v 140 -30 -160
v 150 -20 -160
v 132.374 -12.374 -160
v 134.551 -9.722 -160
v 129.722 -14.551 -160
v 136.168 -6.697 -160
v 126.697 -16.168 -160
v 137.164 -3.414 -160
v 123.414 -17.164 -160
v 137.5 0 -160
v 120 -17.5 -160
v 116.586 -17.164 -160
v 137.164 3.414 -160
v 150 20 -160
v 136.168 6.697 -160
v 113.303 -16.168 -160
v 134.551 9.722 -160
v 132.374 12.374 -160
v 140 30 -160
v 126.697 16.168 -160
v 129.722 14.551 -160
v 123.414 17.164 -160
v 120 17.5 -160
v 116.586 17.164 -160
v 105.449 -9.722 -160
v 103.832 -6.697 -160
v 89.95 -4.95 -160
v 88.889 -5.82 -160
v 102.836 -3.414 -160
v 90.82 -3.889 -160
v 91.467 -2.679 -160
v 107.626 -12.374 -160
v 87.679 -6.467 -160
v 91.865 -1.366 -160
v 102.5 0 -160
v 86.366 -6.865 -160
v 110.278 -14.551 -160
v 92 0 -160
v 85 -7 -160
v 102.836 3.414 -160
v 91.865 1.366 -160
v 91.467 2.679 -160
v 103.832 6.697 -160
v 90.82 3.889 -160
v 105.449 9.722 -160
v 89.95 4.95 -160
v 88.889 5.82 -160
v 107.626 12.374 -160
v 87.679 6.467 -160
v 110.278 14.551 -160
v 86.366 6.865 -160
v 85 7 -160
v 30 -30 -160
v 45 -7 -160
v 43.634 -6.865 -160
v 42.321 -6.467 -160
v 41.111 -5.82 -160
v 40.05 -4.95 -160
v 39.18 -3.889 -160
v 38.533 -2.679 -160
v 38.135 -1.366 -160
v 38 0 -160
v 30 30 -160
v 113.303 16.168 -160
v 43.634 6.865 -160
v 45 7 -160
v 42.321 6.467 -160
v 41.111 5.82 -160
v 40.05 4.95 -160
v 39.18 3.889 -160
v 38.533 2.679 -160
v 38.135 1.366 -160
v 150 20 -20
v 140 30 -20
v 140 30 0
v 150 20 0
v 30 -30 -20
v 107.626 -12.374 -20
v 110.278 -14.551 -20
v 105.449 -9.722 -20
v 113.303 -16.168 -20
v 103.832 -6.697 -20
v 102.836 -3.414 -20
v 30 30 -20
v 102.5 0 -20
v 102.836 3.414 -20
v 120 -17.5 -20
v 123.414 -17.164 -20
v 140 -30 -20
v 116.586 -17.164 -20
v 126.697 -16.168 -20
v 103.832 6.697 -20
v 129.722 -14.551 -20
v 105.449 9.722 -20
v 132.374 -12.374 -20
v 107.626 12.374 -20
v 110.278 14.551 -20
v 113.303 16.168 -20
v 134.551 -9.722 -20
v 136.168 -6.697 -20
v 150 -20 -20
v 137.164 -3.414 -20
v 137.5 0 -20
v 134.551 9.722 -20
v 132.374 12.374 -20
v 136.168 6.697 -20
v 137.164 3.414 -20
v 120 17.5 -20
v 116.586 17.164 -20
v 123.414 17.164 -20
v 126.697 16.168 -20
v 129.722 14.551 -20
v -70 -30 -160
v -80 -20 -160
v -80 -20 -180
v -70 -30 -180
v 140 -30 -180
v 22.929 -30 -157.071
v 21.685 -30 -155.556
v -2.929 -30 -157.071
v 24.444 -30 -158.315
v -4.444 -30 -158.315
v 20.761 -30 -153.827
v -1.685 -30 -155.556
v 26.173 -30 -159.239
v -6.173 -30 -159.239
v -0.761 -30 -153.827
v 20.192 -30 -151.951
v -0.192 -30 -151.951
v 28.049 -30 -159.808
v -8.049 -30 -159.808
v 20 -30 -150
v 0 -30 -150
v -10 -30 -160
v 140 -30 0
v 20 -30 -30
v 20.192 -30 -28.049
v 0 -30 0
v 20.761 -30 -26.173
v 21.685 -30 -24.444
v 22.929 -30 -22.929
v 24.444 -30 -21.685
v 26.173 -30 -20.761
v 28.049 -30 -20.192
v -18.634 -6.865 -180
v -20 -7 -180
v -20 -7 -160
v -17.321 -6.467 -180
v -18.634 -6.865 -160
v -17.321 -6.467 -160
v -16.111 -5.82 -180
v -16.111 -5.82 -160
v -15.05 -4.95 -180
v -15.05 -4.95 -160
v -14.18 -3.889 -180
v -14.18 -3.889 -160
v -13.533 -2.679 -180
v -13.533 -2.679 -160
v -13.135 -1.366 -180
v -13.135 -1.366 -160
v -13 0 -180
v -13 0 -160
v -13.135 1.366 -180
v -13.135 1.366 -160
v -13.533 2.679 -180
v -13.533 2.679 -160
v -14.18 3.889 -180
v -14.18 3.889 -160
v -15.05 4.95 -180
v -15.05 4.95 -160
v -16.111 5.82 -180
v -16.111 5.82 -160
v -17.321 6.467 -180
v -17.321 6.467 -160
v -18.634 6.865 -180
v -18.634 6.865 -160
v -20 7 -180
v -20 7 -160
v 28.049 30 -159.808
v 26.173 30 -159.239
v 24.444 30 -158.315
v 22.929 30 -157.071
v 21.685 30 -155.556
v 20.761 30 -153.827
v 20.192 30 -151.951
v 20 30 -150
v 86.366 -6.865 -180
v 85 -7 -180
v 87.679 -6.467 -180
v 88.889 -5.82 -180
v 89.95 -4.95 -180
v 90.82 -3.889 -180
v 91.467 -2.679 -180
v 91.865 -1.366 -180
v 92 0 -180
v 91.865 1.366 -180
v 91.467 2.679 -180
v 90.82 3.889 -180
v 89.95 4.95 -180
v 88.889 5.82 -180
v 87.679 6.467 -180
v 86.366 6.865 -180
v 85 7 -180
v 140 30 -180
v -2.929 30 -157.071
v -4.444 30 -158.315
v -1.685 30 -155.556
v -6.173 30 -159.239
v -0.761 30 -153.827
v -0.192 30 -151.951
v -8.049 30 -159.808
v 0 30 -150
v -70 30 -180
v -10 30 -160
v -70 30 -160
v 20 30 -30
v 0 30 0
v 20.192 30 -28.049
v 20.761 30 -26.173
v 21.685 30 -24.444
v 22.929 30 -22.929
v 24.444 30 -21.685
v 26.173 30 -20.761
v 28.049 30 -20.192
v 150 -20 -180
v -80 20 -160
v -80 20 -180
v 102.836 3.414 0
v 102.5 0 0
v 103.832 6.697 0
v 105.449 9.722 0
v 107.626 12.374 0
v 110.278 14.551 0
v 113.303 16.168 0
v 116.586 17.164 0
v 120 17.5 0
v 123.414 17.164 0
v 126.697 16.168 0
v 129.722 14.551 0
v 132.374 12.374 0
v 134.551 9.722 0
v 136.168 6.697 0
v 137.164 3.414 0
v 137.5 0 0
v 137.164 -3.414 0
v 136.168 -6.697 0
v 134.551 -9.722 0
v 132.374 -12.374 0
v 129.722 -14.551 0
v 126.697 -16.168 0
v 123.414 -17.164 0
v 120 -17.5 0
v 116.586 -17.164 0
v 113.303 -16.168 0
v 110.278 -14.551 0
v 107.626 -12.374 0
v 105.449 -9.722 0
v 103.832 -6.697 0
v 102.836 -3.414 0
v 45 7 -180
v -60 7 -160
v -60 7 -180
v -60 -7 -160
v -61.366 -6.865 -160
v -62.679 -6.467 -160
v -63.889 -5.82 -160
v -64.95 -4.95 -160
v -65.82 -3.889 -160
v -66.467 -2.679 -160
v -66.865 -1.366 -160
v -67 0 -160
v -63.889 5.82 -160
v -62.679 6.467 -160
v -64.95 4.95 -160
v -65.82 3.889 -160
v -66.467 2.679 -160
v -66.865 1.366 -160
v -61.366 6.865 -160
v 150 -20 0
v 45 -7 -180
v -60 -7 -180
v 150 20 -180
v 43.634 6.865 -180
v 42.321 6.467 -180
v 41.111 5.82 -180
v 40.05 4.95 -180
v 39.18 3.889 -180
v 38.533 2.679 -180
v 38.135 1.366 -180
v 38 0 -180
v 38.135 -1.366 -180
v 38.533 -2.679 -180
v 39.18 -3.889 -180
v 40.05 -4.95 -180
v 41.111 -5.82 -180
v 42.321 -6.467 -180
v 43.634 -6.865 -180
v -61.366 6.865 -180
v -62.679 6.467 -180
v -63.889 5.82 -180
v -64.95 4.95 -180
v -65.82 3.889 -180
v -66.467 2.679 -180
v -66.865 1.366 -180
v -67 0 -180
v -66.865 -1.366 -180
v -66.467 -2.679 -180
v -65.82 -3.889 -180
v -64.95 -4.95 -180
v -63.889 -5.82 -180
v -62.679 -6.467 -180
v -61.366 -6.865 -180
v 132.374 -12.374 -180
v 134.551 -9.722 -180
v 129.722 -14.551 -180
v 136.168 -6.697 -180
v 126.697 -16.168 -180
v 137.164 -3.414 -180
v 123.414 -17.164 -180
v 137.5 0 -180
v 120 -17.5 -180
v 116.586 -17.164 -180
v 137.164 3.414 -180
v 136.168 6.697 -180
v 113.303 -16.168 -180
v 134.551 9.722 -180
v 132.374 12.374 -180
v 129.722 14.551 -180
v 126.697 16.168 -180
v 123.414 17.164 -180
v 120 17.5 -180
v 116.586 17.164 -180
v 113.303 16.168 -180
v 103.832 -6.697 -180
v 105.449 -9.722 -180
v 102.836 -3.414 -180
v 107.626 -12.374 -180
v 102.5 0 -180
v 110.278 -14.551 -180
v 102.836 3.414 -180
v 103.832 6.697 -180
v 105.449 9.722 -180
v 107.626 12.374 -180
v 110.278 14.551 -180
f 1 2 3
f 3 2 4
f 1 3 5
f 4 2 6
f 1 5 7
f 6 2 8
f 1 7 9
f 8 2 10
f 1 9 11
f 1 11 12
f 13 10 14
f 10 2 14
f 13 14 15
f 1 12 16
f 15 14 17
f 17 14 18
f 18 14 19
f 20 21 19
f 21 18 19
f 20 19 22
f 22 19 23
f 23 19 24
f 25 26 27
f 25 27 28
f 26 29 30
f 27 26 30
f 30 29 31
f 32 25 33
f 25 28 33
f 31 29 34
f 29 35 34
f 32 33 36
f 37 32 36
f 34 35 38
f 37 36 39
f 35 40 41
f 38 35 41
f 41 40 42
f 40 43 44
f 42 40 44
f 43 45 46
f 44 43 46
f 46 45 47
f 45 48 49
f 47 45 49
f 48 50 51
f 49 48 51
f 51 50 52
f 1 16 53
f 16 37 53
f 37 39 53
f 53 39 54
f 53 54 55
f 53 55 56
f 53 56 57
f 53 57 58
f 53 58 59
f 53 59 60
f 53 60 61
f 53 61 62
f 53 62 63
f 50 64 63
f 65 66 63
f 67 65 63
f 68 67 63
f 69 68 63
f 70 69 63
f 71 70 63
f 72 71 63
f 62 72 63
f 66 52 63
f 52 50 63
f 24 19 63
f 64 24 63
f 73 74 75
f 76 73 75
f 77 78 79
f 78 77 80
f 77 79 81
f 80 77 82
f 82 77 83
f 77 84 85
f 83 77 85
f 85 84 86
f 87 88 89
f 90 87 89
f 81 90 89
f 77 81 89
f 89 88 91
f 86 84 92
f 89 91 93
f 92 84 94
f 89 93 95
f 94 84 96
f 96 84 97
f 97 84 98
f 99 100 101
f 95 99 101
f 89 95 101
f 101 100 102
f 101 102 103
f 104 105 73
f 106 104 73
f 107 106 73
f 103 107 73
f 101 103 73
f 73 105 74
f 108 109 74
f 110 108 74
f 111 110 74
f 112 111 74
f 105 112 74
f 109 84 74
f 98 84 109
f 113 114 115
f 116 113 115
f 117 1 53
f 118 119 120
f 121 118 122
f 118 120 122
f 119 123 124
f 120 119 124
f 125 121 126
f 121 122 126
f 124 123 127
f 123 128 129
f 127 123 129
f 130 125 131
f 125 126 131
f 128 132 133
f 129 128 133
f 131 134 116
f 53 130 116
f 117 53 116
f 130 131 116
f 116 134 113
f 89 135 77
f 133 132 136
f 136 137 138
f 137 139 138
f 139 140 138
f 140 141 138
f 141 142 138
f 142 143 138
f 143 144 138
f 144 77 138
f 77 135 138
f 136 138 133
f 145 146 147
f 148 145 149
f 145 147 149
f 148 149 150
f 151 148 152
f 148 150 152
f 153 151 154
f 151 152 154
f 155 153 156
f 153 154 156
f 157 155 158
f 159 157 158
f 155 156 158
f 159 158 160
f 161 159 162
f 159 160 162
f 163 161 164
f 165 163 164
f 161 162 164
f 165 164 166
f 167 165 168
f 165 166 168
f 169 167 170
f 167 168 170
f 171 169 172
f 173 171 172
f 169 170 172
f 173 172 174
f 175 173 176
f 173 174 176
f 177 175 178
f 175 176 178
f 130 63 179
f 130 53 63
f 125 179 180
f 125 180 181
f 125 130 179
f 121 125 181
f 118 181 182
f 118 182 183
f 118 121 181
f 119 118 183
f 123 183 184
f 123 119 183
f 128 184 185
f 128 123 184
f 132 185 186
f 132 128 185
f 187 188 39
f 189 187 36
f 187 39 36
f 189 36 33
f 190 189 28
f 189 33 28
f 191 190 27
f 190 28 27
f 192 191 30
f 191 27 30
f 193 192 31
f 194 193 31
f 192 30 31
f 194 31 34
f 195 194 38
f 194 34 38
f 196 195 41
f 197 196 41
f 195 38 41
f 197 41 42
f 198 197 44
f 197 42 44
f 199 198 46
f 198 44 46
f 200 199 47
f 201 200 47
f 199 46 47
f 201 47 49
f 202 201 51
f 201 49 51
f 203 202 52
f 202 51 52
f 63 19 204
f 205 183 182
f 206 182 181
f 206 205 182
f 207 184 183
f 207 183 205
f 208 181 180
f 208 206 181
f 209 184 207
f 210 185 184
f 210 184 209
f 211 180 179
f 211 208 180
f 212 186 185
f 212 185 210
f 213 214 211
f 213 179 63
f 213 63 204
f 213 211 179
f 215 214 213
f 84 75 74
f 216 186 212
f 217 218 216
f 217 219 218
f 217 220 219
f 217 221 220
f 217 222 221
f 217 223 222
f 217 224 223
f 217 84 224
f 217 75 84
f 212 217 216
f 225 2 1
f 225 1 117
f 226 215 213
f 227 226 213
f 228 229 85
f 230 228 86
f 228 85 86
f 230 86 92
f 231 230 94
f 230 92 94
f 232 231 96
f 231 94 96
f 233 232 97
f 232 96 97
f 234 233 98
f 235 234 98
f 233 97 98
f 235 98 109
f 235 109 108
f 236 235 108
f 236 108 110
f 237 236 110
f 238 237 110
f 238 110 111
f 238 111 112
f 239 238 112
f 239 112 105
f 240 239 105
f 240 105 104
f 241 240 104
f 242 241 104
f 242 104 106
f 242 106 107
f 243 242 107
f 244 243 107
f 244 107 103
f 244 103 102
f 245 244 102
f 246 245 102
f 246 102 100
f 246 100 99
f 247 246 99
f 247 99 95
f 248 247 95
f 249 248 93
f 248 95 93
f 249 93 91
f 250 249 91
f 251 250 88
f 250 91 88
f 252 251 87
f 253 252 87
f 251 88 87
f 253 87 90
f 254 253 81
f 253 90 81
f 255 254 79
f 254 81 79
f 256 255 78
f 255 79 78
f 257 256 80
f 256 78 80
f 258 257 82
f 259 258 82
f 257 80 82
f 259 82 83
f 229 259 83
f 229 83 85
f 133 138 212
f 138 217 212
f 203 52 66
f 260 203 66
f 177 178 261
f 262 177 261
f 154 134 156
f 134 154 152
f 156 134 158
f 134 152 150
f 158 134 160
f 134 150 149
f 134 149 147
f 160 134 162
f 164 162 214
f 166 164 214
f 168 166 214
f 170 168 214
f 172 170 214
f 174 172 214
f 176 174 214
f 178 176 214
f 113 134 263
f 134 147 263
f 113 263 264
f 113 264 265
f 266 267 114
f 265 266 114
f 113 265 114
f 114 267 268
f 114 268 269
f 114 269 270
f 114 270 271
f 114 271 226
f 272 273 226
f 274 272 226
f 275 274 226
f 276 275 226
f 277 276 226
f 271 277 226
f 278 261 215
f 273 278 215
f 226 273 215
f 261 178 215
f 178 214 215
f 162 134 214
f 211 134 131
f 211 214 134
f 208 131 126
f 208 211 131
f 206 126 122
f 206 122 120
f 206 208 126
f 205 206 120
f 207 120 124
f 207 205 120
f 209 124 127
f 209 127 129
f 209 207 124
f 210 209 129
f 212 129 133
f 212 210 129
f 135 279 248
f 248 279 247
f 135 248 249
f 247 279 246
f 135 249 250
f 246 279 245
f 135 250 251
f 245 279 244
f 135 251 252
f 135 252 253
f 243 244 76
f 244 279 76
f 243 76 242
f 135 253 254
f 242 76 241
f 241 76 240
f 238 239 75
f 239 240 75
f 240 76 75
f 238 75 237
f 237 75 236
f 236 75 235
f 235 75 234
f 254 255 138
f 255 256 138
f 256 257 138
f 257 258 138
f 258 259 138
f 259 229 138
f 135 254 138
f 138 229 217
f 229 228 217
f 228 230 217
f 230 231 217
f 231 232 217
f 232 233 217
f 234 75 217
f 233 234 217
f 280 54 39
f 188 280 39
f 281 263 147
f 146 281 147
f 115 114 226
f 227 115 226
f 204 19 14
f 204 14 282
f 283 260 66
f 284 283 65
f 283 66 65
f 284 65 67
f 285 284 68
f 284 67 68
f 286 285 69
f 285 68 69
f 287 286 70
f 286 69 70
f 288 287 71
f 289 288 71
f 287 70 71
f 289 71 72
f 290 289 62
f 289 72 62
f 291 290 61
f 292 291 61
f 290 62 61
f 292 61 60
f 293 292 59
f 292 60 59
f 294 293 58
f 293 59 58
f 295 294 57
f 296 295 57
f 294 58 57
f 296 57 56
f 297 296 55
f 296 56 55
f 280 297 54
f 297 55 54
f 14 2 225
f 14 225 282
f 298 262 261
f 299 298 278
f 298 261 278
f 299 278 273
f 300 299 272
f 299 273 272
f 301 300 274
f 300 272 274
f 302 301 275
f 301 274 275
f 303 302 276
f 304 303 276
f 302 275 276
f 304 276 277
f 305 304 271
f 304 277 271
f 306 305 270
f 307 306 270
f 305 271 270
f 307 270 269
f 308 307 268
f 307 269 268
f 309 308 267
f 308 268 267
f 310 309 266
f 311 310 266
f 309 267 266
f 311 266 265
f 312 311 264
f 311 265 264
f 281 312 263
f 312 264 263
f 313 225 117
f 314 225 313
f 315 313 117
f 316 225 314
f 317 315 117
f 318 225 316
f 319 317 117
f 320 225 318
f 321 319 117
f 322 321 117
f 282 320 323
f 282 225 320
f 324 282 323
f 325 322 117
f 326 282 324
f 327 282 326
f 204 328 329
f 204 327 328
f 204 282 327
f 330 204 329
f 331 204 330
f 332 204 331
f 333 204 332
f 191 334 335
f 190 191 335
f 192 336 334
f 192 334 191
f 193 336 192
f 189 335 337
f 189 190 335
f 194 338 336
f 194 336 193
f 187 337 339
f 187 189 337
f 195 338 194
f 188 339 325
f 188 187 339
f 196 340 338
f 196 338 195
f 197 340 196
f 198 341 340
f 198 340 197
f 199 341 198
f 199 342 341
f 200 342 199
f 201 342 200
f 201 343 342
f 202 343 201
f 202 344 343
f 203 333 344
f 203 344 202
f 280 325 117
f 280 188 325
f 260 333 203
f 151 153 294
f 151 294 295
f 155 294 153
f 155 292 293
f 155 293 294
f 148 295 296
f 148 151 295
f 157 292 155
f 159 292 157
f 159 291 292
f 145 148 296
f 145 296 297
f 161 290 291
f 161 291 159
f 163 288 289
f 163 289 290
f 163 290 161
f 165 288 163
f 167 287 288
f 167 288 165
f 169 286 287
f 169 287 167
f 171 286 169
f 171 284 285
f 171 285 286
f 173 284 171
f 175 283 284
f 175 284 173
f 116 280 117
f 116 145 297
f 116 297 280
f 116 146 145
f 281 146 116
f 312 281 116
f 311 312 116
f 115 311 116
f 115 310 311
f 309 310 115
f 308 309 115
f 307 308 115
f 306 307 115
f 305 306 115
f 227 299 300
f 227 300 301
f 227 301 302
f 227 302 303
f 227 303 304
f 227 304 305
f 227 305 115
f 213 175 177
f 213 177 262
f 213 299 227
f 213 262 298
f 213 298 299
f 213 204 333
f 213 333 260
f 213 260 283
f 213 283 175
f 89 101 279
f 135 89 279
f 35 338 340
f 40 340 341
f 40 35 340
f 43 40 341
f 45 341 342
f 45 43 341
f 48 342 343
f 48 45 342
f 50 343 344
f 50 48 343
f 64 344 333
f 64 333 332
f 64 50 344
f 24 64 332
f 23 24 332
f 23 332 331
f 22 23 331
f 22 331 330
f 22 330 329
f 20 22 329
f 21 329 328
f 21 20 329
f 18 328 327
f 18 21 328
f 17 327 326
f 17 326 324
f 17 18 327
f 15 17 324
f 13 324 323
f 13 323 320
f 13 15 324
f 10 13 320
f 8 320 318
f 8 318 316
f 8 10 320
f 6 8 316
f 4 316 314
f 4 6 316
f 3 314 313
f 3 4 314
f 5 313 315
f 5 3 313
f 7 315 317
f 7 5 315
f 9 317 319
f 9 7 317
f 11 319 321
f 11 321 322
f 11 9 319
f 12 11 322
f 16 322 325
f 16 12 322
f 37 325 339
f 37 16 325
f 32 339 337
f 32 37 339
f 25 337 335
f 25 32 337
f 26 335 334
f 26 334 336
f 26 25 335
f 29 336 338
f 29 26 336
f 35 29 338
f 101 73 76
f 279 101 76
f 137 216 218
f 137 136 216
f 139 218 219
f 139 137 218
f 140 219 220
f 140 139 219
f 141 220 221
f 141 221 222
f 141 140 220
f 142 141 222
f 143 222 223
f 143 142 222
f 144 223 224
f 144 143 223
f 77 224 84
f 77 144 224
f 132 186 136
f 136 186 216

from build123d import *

# Parameters (mm, degrees)
BOSS_EXTRUDE1_DEPTH     = 30
SKETCH3_W               = 230
SKETCH3_H               = 60
SKETCH3_R               = 17.5
BOSS_EXTRUDE2_DEPTH     = 20
FILLET1_R               = 10
CHAMFER1_SIZE           = 10
SKETCH5_R               = 17.5
CUT_EXTRUDE1_DEPTH      = 1
CUT_EXTRUDE1_DEPTH_BACK = 181


with BuildPart() as part:
    # Sketch1 → Boss-Extrude1 (new body, symmetric)
    with BuildSketch(Plane(origin=(0, 0, 0), x_dir=(1, 0, 0), z_dir=(0, 1, 0))):
        Polygon((0, 160), (10, 160), (20, 160), (20, 20), (150, 20), (150, 0), (0, 0), align=None)
    extrude(amount=BOSS_EXTRUDE1_DEPTH, both=True)

    # Sketch3 → Boss-Extrude2 (add)
    with BuildSketch(Plane(origin=(0, 0, -160), x_dir=(-1, 0, 0), z_dir=(0, 0, -1))):
        with Locations((-35, 0)):
            Rectangle(SKETCH3_W, SKETCH3_H)
        with Locations((-120, 0)):
            Circle(SKETCH3_R, mode=Mode.SUBTRACT)
        with BuildLine():
            Line((60, -7), (20, -7))
            ThreePointArc((20, -7), (13, 0), (20, 7))
            Line((20, 7), (60, 7))
            ThreePointArc((60, 7), (67, 0), (60, -7))
        make_face(mode=Mode.SUBTRACT)
        with BuildLine():
            Line((-45, -7), (-85, -7))
            ThreePointArc((-85, -7), (-92, 0), (-85, 7))
            Line((-85, 7), (-45, 7))
            ThreePointArc((-45, 7), (-38, 0), (-45, -7))
        make_face(mode=Mode.SUBTRACT)
    extrude(amount=BOSS_EXTRUDE2_DEPTH)

    # Fillet1
    fillet1_edges = [part.edges().sort_by_distance(p)[0] for p in [
        (20, 0, -160),
        (20, 0, -20),
        (0, 0, -160),
    ]]
    fillet(fillet1_edges, radius=FILLET1_R)

    # Chamfer1
    chamfer1_edges = [part.edges().sort_by_distance(p)[0] for p in [
        (150, 30, -10),
        (150, 30, -170),
        (150, -30, -170),
        (-80, -30, -170),
        (-80, 30, -170),
        (150, -30, -10),
    ]]
    chamfer(chamfer1_edges, length=CHAMFER1_SIZE)

    # Sketch5 → Cut-Extrude1 (cut, two sides)
    with BuildSketch(Plane(origin=(0, 0, -180), x_dir=(-1, 0, 0), z_dir=(0, 0, -1))) as cut_extrude1_sk:
        with Locations((-120, 0)):
            Circle(SKETCH5_R)
    extrude(amount=CUT_EXTRUDE1_DEPTH, mode=Mode.SUBTRACT)
    extrude(cut_extrude1_sk.sketch, amount=-CUT_EXTRUDE1_DEPTH_BACK, mode=Mode.SUBTRACT)


solid = part.part
